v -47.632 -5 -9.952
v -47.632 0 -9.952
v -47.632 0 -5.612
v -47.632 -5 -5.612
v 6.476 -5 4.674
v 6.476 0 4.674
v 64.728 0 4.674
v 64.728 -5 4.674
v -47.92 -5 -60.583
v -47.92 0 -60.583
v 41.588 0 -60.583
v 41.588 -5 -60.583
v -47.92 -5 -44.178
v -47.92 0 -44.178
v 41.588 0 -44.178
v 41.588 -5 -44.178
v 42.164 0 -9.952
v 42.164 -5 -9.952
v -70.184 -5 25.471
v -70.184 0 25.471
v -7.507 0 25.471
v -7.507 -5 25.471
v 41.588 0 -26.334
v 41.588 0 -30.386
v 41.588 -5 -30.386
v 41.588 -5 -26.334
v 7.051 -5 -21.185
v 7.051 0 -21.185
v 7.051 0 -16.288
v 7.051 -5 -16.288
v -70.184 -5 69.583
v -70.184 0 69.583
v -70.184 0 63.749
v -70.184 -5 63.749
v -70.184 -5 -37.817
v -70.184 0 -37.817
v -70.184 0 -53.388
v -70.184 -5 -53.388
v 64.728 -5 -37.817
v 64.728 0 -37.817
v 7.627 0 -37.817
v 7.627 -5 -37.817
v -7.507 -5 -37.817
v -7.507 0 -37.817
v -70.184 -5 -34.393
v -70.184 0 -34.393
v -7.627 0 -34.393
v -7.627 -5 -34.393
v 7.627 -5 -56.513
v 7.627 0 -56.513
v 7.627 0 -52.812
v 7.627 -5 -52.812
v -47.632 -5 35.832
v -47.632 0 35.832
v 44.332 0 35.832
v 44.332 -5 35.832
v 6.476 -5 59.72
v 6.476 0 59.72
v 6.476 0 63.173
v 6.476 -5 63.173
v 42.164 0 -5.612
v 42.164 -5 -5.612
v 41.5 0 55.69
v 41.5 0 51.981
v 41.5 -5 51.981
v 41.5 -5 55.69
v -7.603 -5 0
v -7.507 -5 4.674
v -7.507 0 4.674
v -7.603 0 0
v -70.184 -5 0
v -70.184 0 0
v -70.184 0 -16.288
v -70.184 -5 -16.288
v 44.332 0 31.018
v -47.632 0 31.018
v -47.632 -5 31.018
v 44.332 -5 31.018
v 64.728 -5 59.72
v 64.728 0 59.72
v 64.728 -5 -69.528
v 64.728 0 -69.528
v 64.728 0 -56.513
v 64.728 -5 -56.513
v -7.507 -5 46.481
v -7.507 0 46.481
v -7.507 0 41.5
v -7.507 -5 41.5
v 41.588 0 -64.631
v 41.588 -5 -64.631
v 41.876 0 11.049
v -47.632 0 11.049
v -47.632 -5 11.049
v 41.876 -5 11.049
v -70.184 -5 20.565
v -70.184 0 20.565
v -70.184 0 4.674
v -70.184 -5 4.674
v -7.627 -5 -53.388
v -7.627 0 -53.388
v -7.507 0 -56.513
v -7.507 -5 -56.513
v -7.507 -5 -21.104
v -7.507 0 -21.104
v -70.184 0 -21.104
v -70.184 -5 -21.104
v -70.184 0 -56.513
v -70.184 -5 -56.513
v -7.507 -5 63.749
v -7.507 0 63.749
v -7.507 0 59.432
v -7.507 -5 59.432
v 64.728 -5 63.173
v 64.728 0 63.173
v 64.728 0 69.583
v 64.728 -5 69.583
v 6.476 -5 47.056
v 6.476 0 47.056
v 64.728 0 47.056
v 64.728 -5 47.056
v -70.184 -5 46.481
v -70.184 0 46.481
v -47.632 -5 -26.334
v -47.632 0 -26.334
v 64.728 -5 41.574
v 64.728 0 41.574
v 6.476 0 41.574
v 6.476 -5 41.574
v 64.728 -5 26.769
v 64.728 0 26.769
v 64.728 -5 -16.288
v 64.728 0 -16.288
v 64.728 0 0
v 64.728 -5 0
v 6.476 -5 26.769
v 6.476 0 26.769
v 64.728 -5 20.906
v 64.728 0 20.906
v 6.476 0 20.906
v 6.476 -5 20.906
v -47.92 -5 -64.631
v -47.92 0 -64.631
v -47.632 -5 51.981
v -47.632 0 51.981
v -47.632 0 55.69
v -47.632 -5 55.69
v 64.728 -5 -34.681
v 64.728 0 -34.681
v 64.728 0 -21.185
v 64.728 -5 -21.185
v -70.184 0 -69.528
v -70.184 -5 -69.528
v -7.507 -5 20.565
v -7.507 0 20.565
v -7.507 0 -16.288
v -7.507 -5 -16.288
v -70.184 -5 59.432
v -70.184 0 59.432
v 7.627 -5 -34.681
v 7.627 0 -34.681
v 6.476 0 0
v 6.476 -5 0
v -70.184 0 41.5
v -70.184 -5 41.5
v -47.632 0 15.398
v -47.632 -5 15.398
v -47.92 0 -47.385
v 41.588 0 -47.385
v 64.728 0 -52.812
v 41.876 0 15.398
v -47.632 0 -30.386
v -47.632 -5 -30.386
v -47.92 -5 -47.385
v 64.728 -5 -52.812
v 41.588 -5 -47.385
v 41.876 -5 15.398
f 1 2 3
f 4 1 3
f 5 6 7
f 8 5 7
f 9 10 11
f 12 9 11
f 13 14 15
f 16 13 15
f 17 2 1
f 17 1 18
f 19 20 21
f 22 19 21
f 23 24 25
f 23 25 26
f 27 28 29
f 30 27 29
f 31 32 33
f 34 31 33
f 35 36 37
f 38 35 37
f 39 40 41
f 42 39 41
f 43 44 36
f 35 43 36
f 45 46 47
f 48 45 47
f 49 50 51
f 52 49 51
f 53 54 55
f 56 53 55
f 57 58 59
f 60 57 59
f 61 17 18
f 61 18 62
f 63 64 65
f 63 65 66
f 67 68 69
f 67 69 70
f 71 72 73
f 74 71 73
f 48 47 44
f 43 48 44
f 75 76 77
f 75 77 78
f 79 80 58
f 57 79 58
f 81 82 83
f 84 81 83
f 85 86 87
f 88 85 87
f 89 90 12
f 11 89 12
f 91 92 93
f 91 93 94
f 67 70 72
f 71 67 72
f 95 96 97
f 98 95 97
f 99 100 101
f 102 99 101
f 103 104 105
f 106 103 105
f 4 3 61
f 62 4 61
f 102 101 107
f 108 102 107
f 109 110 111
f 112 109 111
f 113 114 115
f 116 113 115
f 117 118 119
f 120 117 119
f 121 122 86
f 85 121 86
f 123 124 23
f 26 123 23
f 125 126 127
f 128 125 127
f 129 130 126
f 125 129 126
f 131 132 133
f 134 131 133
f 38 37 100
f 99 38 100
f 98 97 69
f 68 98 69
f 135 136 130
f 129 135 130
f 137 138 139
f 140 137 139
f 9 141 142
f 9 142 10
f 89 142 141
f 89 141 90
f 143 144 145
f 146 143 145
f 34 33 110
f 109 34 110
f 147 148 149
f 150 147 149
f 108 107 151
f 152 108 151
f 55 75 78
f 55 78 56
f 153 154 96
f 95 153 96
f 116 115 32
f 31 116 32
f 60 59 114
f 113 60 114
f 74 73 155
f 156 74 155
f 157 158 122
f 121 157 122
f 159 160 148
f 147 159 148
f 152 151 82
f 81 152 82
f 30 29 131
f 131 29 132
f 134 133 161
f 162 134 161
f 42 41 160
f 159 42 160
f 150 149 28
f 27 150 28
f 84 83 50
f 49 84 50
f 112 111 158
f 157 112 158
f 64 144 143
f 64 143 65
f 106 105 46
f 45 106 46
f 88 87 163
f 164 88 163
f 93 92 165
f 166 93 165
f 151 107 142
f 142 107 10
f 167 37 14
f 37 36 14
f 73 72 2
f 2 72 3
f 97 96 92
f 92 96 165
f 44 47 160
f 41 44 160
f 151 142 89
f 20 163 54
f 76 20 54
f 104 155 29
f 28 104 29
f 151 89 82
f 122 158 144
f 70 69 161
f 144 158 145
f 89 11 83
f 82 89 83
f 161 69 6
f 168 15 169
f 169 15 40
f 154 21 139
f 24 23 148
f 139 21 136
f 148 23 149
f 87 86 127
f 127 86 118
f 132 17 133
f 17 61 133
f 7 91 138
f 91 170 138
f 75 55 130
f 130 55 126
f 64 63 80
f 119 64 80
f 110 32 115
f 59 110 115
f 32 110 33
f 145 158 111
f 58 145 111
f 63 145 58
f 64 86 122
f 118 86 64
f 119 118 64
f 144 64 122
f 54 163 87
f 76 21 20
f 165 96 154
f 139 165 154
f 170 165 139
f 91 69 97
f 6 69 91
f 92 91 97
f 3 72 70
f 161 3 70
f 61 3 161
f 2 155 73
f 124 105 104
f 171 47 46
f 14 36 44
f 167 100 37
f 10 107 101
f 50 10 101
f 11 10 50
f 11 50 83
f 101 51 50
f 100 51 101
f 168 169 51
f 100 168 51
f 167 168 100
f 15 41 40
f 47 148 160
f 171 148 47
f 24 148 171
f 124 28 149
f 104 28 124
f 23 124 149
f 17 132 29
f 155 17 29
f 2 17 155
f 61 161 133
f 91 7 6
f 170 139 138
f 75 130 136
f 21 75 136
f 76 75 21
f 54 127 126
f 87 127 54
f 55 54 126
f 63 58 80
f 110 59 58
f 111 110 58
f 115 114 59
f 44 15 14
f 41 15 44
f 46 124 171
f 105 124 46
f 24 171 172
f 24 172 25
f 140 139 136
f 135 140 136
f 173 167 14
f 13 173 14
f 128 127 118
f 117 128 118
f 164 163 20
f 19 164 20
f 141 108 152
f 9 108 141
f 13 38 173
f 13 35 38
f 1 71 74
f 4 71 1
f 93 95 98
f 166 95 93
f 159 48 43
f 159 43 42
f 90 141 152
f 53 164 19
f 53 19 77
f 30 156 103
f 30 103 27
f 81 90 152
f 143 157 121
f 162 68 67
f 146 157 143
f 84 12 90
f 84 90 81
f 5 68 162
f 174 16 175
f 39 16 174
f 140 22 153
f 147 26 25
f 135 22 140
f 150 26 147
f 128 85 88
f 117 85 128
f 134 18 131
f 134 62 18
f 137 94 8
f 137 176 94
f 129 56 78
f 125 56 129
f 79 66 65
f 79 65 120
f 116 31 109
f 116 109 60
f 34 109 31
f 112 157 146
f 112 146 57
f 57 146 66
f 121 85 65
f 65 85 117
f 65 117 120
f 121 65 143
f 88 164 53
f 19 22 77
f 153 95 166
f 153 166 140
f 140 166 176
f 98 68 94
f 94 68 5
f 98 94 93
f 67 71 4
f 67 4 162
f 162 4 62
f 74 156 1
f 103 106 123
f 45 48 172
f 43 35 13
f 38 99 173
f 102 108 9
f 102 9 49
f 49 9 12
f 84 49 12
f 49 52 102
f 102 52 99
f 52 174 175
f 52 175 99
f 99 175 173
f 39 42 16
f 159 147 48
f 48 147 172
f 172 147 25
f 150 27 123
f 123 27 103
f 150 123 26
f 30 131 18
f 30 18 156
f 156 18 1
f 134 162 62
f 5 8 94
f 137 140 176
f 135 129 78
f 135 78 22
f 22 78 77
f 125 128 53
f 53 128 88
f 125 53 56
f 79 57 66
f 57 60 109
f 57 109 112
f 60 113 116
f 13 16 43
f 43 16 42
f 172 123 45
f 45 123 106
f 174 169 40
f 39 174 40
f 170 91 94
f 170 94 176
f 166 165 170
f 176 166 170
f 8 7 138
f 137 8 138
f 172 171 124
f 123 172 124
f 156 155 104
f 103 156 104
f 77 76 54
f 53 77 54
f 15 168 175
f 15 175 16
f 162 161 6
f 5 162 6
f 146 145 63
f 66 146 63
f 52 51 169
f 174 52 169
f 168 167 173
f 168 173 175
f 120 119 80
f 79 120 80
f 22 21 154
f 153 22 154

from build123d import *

# Parameters (mm, degrees)
F0_W     = 89.507591
F0_H     = 4.047405
F0_H_2   = 3.206663
F0_W_2   = 89.219786
F0_H_3   = 4.051941
F0_W_3   = 89.795395
F0_H_4   = 4.339748
F0_H_5   = 4.34881
F0_W_4   = 89.131403
F0_H_6   = 3.709744
F0_W_5   = 91.964136
F0_H_7   = 4.813378
F1_DEPTH = 5


with BuildPart() as f1:
    # F0 (on Front) → F1 (new body)
    with BuildSketch(Plane.XZ):
        Polygon((64.727969, 69.582537), (-70.183687, 69.582537), (-70.183687, 63.748978), (-7.506745, 63.748978), (-7.506745, 59.431892), (-70.183687, 59.431892), (-70.183687, 46.48063), (-7.506745, 46.48063), (-7.506745, 41.499555), (-70.183687, 41.499555), (-70.183687, 25.47081), (-7.506745, 25.47081), (-7.506745, 20.564513), (-70.183687, 20.564513), (-70.183687, 4.67401), (-7.506745, 4.67401), (-7.603418, 0), (-70.183687, 0), (-70.183687, -16.288219), (-7.506745, -16.288219), (-7.506745, -21.103866), (-70.183687, -21.103866), (-70.183687, -34.392789), (-7.626853, -34.392789), (-7.506745, -37.816998), (-70.183687, -37.816998), (-70.183687, -53.38797), (-7.626853, -53.38797), (-7.506745, -56.513045), (-70.183687, -56.513045), (-70.183687, -69.527753), (64.727969, -69.527753), (64.727969, -56.513045), (7.626853, -56.513045), (7.626853, -52.81236), (64.727969, -52.81236), (64.727969, -37.816998), (7.626853, -37.816998), (7.626853, -34.680594), (64.727969, -34.680594), (64.727969, -21.185448), (7.051241, -21.185448), (7.051241, -16.288219), (64.727969, -16.288219), (64.727969, 0), (6.47563, 0), (6.47563, 4.67401), (64.727969, 4.67401), (64.727969, 20.905621), (6.47563, 20.905621), (6.47563, 26.769336), (64.727969, 26.769336), (64.727969, 41.574333), (6.47563, 41.574333), (6.47563, 47.056243), (64.727969, 47.056243), (64.727969, 59.719693), (6.47563, 59.719693), (6.47563, 63.173369), (64.727969, 63.173369), align=None)
        with Locations((-3.165862, -62.606814)):
            Rectangle(F0_W, F0_H, mode=Mode.SUBTRACT)
        with Locations((-3.165862, -45.781515)):
            Rectangle(F0_W, F0_H_2, mode=Mode.SUBTRACT)
        with Locations((-3.021959, -28.360198)):
            Rectangle(F0_W_2, F0_H_3, mode=Mode.SUBTRACT)
        with Locations((-2.734154, -7.782086)):
            Rectangle(F0_W_3, F0_H_4, mode=Mode.SUBTRACT)
        with Locations((-2.878056, 13.223202)):
            Rectangle(F0_W, F0_H_5, mode=Mode.SUBTRACT)
        with Locations((-3.06615, 53.835543)):
            Rectangle(F0_W_4, F0_H_6, mode=Mode.SUBTRACT)
        with Locations((-1.649784, 33.425127)):
            Rectangle(F0_W_5, F0_H_7, mode=Mode.SUBTRACT)
    extrude(amount=F1_DEPTH)


solid = f1.part
